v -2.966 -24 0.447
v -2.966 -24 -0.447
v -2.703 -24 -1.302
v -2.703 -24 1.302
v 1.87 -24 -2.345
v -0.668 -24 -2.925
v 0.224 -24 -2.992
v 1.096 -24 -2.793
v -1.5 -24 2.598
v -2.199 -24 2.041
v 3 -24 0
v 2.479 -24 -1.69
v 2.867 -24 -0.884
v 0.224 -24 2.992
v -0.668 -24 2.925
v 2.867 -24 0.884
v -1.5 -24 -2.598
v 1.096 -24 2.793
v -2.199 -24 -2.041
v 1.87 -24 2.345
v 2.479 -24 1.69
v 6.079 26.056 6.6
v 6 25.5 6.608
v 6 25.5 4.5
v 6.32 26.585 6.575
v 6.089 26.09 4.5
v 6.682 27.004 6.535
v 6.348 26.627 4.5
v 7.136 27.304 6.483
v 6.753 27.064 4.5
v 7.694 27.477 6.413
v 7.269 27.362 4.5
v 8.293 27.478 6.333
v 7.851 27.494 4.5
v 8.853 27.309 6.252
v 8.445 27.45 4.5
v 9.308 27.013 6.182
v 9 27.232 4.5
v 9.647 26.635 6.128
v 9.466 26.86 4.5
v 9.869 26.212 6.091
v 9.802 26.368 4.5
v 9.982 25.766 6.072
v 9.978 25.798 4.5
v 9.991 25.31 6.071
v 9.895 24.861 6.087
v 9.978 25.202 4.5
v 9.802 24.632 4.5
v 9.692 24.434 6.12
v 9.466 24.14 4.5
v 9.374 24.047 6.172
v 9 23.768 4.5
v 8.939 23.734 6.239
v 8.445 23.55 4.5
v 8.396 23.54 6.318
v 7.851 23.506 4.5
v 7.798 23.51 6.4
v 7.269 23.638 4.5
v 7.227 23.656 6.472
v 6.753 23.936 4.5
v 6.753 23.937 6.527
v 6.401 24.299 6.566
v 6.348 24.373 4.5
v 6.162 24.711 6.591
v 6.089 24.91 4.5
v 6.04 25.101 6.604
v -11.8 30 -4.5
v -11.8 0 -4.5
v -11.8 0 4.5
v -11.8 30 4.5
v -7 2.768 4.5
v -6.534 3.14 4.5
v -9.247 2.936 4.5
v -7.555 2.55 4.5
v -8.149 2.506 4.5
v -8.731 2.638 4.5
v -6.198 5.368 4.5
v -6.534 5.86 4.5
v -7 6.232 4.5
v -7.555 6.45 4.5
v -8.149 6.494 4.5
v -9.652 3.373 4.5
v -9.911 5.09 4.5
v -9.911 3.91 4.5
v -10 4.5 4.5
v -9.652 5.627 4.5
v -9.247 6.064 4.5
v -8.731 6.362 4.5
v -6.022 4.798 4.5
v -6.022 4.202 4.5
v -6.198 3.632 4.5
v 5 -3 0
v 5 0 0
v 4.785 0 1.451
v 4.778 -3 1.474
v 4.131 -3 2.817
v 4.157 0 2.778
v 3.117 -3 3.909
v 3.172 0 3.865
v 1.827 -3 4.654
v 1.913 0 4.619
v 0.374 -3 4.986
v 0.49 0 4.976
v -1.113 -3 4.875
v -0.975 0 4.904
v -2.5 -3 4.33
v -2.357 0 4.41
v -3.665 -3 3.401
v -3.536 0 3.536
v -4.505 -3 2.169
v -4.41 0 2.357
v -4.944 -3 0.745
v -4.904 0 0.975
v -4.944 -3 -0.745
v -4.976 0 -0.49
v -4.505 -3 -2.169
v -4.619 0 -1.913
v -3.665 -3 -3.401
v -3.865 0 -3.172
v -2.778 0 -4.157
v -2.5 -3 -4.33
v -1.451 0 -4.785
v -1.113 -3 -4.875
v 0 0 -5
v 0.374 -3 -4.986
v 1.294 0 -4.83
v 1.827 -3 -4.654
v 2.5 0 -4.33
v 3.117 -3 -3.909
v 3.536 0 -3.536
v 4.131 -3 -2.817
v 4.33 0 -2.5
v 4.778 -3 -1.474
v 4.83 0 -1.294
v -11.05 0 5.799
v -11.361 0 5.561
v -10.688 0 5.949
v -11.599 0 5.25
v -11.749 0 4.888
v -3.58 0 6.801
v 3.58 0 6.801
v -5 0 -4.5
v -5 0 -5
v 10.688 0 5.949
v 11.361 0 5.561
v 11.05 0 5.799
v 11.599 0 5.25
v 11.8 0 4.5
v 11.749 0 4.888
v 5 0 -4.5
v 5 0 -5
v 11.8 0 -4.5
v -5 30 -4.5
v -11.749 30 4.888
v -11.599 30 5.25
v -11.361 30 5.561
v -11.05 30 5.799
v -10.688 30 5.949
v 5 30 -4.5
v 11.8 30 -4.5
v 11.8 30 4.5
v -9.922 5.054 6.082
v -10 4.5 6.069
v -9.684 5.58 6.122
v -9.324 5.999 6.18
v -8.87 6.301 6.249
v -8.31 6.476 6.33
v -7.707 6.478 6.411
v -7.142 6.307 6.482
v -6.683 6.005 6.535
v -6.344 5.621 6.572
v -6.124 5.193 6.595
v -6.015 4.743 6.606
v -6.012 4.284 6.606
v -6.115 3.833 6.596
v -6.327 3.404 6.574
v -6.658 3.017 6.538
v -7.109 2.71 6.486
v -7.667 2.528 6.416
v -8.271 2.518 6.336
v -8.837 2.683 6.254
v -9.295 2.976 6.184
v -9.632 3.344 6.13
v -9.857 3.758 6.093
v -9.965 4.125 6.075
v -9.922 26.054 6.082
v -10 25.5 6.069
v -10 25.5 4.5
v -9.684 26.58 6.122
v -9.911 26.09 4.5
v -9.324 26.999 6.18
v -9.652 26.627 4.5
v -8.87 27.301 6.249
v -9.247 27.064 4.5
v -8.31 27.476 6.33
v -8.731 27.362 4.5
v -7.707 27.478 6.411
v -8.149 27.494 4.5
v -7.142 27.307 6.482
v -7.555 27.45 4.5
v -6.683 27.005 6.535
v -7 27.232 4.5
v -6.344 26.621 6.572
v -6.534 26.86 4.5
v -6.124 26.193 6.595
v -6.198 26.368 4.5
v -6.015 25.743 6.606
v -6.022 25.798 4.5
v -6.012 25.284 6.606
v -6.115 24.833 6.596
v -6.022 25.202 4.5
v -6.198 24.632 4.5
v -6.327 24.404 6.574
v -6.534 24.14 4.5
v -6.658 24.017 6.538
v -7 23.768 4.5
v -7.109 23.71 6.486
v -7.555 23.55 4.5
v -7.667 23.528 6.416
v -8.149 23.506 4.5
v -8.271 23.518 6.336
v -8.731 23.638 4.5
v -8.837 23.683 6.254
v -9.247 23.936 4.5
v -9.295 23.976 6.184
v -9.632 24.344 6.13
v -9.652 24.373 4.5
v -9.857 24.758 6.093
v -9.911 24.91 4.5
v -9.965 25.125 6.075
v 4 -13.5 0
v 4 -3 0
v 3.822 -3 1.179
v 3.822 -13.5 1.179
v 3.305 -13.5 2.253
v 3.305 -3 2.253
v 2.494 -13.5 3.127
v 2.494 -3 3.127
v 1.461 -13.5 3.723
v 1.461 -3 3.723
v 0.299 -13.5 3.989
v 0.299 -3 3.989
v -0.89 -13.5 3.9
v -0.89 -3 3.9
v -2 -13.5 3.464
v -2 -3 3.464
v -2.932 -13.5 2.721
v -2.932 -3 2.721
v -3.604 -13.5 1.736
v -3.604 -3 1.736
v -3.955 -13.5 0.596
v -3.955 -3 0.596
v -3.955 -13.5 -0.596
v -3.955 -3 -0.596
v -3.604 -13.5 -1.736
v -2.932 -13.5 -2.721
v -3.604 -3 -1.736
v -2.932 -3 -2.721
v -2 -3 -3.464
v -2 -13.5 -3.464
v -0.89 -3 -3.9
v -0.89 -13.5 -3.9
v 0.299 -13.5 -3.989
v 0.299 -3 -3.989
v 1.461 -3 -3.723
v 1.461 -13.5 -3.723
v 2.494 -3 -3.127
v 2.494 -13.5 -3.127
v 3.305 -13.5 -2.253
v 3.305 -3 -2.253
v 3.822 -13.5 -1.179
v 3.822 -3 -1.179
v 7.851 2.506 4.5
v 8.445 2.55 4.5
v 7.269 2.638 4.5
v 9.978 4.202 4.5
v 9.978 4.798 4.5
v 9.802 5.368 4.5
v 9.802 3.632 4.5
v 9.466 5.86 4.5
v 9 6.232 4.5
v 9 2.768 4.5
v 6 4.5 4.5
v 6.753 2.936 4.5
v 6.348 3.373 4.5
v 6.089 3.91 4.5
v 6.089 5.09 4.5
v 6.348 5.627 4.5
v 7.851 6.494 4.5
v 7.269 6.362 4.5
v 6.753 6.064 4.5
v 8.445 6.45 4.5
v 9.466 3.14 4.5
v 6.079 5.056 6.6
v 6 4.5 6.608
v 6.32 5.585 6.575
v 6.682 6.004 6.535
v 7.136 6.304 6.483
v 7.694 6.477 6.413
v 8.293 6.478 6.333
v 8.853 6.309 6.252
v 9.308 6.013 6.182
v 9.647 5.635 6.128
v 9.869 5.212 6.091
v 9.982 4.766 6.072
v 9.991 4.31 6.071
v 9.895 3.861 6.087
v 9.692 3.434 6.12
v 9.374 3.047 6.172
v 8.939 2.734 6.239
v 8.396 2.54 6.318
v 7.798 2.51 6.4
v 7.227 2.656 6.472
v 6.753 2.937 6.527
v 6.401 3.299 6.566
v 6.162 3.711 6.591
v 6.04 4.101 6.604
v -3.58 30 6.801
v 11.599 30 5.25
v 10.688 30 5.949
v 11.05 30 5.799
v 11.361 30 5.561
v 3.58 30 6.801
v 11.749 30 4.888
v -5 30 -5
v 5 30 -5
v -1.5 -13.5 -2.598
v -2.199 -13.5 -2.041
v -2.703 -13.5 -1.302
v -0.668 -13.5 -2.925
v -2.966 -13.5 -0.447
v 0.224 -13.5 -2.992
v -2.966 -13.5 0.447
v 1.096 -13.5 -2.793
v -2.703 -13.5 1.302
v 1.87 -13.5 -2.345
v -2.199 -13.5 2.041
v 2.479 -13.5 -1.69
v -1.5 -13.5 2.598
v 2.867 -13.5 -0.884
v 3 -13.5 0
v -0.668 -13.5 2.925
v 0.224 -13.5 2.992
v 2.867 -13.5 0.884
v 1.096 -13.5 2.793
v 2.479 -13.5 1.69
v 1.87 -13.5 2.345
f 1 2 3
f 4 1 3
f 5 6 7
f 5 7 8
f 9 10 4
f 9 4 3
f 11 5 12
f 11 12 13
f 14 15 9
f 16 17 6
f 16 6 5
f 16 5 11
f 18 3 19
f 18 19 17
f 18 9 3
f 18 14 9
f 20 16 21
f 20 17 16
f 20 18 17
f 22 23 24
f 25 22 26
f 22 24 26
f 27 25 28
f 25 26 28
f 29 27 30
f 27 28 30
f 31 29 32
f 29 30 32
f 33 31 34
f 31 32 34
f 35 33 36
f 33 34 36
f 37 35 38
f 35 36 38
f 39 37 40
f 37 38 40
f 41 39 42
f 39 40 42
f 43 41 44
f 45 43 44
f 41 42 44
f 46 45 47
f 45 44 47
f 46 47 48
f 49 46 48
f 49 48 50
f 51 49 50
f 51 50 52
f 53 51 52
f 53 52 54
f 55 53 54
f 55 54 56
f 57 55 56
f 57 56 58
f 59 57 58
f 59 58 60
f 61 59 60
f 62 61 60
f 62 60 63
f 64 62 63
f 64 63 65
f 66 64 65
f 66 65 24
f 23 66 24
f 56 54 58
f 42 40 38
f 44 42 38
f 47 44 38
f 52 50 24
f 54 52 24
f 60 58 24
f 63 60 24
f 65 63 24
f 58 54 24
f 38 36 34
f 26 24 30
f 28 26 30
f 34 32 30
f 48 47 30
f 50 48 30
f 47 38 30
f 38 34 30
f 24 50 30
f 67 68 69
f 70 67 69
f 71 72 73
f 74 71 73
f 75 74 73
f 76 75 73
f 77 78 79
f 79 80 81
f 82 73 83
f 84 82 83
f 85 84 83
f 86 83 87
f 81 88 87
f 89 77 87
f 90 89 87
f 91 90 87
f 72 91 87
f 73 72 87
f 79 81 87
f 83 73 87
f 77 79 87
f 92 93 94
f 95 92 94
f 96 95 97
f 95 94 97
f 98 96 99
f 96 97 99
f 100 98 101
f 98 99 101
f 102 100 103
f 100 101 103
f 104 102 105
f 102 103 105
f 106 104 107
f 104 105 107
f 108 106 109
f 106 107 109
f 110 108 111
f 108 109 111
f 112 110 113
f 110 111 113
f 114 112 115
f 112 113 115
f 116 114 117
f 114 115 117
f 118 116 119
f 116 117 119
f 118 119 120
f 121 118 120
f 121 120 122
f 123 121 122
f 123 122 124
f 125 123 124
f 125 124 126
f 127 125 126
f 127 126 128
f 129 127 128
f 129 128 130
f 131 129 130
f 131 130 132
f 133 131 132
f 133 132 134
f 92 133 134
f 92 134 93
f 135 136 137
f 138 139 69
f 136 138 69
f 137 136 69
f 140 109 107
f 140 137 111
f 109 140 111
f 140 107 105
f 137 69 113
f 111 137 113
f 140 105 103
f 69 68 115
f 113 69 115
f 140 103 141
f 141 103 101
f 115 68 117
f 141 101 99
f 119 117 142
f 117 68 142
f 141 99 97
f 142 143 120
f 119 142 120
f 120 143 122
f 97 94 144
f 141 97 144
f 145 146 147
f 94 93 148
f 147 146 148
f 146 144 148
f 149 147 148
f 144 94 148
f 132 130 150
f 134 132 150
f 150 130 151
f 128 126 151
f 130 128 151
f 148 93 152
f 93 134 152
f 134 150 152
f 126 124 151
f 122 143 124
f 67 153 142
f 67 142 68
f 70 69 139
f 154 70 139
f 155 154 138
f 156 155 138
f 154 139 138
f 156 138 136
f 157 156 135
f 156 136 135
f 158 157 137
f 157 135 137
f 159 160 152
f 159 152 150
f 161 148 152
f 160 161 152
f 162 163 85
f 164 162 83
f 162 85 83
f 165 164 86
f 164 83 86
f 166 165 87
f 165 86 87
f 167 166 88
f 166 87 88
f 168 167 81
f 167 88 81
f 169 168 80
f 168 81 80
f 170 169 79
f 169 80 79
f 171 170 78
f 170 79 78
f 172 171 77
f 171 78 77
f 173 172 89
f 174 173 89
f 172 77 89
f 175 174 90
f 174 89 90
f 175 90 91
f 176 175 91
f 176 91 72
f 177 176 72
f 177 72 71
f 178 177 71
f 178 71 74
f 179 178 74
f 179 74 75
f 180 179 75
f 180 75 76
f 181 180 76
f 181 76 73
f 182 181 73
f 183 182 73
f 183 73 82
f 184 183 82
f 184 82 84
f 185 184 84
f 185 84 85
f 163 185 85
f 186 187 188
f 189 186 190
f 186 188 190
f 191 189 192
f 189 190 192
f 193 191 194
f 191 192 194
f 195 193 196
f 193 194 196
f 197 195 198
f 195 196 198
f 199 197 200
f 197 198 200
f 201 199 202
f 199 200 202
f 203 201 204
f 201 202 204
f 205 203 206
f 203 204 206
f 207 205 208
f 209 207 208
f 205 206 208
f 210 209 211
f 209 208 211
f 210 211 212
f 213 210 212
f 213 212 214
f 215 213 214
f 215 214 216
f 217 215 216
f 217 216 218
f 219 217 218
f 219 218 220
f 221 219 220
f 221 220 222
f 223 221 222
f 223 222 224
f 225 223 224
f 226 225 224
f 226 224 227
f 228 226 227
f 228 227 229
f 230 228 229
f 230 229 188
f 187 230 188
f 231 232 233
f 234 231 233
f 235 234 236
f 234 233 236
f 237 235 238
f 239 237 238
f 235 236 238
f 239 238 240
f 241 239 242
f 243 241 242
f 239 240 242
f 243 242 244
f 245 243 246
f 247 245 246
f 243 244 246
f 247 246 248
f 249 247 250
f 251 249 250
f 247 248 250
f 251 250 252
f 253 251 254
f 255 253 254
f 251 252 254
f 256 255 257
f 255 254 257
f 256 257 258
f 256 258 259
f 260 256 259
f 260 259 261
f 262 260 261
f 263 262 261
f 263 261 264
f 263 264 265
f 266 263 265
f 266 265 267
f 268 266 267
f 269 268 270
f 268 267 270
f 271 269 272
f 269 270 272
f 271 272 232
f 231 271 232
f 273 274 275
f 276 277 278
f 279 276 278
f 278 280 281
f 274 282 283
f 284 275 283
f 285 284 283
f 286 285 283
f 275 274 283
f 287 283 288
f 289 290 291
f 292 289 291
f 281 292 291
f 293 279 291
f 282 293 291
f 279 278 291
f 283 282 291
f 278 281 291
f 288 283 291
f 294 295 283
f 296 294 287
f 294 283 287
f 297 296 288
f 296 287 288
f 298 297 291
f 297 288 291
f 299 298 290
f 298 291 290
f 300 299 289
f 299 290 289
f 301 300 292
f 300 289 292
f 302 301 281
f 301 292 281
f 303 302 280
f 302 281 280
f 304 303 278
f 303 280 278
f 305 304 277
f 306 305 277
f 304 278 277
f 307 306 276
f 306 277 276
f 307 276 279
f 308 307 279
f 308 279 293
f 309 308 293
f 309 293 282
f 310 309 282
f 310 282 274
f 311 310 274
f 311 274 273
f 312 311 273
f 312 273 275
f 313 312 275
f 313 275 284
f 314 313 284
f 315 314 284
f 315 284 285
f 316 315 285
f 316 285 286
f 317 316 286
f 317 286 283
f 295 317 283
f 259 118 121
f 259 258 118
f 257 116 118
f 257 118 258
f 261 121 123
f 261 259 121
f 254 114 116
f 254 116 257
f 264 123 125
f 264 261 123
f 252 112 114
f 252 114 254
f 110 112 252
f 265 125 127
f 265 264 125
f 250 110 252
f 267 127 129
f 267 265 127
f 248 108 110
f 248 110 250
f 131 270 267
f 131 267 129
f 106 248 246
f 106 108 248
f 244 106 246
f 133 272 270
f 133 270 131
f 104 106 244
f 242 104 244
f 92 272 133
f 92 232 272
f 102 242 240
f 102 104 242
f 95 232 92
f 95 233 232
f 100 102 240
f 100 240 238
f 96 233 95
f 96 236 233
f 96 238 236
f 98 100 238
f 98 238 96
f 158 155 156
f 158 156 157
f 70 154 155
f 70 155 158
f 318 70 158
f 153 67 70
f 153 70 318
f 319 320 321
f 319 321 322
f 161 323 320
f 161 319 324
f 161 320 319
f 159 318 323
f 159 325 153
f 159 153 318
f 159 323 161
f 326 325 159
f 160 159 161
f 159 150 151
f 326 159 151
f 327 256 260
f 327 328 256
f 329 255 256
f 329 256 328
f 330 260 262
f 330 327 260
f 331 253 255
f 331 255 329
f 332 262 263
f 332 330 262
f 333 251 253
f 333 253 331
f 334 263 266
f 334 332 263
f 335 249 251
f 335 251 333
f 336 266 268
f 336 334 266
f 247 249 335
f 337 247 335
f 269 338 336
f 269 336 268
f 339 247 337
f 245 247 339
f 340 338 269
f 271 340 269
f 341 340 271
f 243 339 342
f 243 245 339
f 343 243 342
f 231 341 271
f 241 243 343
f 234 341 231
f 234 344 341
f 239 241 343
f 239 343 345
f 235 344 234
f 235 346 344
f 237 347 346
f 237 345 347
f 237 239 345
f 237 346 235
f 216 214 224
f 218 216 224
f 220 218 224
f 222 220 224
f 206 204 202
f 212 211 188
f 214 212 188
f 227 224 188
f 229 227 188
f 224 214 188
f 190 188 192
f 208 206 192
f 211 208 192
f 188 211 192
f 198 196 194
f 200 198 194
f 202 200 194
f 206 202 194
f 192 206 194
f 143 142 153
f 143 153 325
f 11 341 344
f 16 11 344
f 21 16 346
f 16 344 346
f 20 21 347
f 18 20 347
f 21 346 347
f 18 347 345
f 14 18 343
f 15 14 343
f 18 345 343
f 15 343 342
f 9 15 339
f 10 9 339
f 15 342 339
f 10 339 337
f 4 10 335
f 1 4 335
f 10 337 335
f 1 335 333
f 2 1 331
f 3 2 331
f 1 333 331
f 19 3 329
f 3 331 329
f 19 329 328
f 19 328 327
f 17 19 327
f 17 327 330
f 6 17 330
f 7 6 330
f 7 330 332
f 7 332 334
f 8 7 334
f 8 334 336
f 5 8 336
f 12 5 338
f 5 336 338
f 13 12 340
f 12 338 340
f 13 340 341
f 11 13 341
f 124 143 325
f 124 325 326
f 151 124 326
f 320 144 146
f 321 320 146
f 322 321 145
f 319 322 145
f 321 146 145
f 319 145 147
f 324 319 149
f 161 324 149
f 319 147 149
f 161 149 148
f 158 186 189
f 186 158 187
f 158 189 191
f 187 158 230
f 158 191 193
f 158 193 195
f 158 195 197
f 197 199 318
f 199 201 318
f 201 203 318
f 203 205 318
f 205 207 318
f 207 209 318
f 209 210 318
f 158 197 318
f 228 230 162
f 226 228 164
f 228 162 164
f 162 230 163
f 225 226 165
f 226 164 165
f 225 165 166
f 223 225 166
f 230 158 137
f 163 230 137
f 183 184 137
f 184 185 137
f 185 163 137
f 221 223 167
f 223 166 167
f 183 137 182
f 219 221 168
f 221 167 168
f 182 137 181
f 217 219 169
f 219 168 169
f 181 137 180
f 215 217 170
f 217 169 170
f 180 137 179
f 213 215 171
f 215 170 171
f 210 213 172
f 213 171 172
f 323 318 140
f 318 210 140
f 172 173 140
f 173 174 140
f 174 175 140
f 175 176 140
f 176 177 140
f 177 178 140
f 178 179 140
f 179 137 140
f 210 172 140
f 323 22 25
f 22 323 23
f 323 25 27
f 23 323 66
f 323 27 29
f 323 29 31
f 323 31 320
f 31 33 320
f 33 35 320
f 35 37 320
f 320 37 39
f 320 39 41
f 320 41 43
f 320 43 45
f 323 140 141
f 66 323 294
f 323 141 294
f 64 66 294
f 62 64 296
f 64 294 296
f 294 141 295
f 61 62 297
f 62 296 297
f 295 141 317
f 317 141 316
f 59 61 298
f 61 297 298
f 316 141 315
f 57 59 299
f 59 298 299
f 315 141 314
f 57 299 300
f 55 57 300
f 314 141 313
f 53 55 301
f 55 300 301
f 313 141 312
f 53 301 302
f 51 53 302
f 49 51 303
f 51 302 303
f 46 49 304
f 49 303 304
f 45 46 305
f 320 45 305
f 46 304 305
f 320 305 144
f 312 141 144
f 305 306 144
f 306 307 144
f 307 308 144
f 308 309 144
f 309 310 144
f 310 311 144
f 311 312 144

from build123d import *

# Parameters (mm, degrees)
SKETCH_1_W          = 10
SKETCH_1_H          = 0.5
EXTRUDE_3_DEPTH     = 30
SKETCH_4_R          = 5
EXTRUDE_4_DEPTH     = 3
SKETCH_5_R          = 4
EXTRUDE_5_DEPTH     = 10.5
SKETCH_6_R          = 3
EXTRUDE_6_DEPTH     = 10.5
CUT_EXTRUDE_2_REACH = 4.408
SKETCH_9_R          = 2


with BuildPart() as part:
    # ｽｹｯﾁ1 → ﾎﾞｽ - 押し出し3 (new body)
    with BuildSketch(Plane(origin=(0, 0, 0), x_dir=(1, 0, 0), z_dir=(0, 1, 0))):
        with BuildLine():
            Line((-5, 4.5), (-11.8, 4.5))
            Line((-11.8, 4.5), (-11.8, -4.5))
            Line((-11.8, -4.5), (0, -4.5))
            ThreePointArc((0, -4.5), (-3.535533906, -3.035533906), (-5, 0.5))
            Line((-5, 0.5), (-5, 4.5))
        make_face()
        with BuildLine():
            Line((5, 4.5), (-5, 4.5))
            Line((-5, 4.5), (-5, 0.5))
            ThreePointArc((-5, 0.5), (-3.535533906, -3.035533906), (0, -4.5))
            ThreePointArc((0, -4.5), (3.535533906, -3.035533906), (5, 0.5))
            Line((5, 0.5), (5, 4.5))
        make_face()
        with BuildLine():
            Line((11.8, 4.5), (5, 4.5))
            Line((5, 4.5), (5, 0.5))
            ThreePointArc((5, 0.5), (3.535533906, -3.035533906), (0, -4.5))
            Line((0, -4.5), (11.8, -4.5))
            Line((11.8, -4.5), (11.8, 4.5))
        make_face()
        with BuildLine():
            ThreePointArc((-11.8, -4.5), (-11.49003001, -5.413142144), (-10.688228568, -5.948888739))
            ThreePointArc((-10.688228568, -5.948888739), (0, -6.908263067), (10.688228568, -5.948888739))
            ThreePointArc((10.688228568, -5.948888739), (11.49003001, -5.413142144), (11.8, -4.5))
            Line((11.8, -4.5), (-11.8, -4.5))
        make_face()
        with Locations((0, 4.75)):
            Rectangle(SKETCH_1_W, SKETCH_1_H)
    extrude(amount=EXTRUDE_3_DEPTH)

    # ｽｹｯﾁ4 → ﾎﾞｽ - 押し出し4 (add)
    with BuildSketch(Plane.XZ):
        Circle(SKETCH_4_R)
    extrude(amount=EXTRUDE_4_DEPTH)

    # ｽｹｯﾁ5 → ﾎﾞｽ - 押し出し5 (add)
    with BuildSketch(Plane.XZ.offset(3)):
        Circle(SKETCH_5_R)
    extrude(amount=EXTRUDE_5_DEPTH)

    # ｽｹｯﾁ6 → ﾎﾞｽ - 押し出し6 (add)
    with BuildSketch(Plane.XZ.offset(13.5)):
        Circle(SKETCH_6_R)
    extrude(amount=EXTRUDE_6_DEPTH)

    # ｽｹｯﾁ9 → ｶｯﾄ - 押し出し2 (cut, up to next)
    with BuildSketch(Plane(origin=(0, 0, 4.5), x_dir=(-1, 0, 0), z_dir=(0, 0, -1)), mode=Mode.PRIVATE) as cut_extrude_2_sk1:
        with Locations((-8, 4.5)):
            Circle(SKETCH_9_R)
    cut_extrude_2_tool1 = extrude(cut_extrude_2_sk1.sketch, amount=-CUT_EXTRUDE_2_REACH, mode=Mode.PRIVATE) & part.part
    add(cut_extrude_2_tool1.solids().sort_by_distance((8, 4.5, 4.5))[0], mode=Mode.SUBTRACT)
    # ｽｹｯﾁ9 → ｶｯﾄ - 押し出し2 (cut, up to next)
    with BuildSketch(Plane(origin=(0, 0, 4.5), x_dir=(-1, 0, 0), z_dir=(0, 0, -1)), mode=Mode.PRIVATE) as cut_extrude_2_sk2:
        with Locations((8, 4.5)):
            Circle(SKETCH_9_R)
    cut_extrude_2_tool2 = extrude(cut_extrude_2_sk2.sketch, amount=-CUT_EXTRUDE_2_REACH, mode=Mode.PRIVATE) & part.part
    add(cut_extrude_2_tool2.solids().sort_by_distance((-8, 4.5, 4.5))[0], mode=Mode.SUBTRACT)
    # ｽｹｯﾁ9 → ｶｯﾄ - 押し出し2 (cut, up to next)
    with BuildSketch(Plane(origin=(0, 0, 4.5), x_dir=(-1, 0, 0), z_dir=(0, 0, -1)), mode=Mode.PRIVATE) as cut_extrude_2_sk3:
        with Locations((8, 25.5)):
            Circle(SKETCH_9_R)
    cut_extrude_2_tool3 = extrude(cut_extrude_2_sk3.sketch, amount=-CUT_EXTRUDE_2_REACH, mode=Mode.PRIVATE) & part.part
    add(cut_extrude_2_tool3.solids().sort_by_distance((-8, 25.5, 4.5))[0], mode=Mode.SUBTRACT)
    # ｽｹｯﾁ9 → ｶｯﾄ - 押し出し2 (cut, up to next)
    with BuildSketch(Plane(origin=(0, 0, 4.5), x_dir=(-1, 0, 0), z_dir=(0, 0, -1)), mode=Mode.PRIVATE) as cut_extrude_2_sk4:
        with Locations((-8, 25.5)):
            Circle(SKETCH_9_R)
    cut_extrude_2_tool4 = extrude(cut_extrude_2_sk4.sketch, amount=-CUT_EXTRUDE_2_REACH, mode=Mode.PRIVATE) & part.part
    add(cut_extrude_2_tool4.solids().sort_by_distance((8, 25.5, 4.5))[0], mode=Mode.SUBTRACT)


solid = part.part
